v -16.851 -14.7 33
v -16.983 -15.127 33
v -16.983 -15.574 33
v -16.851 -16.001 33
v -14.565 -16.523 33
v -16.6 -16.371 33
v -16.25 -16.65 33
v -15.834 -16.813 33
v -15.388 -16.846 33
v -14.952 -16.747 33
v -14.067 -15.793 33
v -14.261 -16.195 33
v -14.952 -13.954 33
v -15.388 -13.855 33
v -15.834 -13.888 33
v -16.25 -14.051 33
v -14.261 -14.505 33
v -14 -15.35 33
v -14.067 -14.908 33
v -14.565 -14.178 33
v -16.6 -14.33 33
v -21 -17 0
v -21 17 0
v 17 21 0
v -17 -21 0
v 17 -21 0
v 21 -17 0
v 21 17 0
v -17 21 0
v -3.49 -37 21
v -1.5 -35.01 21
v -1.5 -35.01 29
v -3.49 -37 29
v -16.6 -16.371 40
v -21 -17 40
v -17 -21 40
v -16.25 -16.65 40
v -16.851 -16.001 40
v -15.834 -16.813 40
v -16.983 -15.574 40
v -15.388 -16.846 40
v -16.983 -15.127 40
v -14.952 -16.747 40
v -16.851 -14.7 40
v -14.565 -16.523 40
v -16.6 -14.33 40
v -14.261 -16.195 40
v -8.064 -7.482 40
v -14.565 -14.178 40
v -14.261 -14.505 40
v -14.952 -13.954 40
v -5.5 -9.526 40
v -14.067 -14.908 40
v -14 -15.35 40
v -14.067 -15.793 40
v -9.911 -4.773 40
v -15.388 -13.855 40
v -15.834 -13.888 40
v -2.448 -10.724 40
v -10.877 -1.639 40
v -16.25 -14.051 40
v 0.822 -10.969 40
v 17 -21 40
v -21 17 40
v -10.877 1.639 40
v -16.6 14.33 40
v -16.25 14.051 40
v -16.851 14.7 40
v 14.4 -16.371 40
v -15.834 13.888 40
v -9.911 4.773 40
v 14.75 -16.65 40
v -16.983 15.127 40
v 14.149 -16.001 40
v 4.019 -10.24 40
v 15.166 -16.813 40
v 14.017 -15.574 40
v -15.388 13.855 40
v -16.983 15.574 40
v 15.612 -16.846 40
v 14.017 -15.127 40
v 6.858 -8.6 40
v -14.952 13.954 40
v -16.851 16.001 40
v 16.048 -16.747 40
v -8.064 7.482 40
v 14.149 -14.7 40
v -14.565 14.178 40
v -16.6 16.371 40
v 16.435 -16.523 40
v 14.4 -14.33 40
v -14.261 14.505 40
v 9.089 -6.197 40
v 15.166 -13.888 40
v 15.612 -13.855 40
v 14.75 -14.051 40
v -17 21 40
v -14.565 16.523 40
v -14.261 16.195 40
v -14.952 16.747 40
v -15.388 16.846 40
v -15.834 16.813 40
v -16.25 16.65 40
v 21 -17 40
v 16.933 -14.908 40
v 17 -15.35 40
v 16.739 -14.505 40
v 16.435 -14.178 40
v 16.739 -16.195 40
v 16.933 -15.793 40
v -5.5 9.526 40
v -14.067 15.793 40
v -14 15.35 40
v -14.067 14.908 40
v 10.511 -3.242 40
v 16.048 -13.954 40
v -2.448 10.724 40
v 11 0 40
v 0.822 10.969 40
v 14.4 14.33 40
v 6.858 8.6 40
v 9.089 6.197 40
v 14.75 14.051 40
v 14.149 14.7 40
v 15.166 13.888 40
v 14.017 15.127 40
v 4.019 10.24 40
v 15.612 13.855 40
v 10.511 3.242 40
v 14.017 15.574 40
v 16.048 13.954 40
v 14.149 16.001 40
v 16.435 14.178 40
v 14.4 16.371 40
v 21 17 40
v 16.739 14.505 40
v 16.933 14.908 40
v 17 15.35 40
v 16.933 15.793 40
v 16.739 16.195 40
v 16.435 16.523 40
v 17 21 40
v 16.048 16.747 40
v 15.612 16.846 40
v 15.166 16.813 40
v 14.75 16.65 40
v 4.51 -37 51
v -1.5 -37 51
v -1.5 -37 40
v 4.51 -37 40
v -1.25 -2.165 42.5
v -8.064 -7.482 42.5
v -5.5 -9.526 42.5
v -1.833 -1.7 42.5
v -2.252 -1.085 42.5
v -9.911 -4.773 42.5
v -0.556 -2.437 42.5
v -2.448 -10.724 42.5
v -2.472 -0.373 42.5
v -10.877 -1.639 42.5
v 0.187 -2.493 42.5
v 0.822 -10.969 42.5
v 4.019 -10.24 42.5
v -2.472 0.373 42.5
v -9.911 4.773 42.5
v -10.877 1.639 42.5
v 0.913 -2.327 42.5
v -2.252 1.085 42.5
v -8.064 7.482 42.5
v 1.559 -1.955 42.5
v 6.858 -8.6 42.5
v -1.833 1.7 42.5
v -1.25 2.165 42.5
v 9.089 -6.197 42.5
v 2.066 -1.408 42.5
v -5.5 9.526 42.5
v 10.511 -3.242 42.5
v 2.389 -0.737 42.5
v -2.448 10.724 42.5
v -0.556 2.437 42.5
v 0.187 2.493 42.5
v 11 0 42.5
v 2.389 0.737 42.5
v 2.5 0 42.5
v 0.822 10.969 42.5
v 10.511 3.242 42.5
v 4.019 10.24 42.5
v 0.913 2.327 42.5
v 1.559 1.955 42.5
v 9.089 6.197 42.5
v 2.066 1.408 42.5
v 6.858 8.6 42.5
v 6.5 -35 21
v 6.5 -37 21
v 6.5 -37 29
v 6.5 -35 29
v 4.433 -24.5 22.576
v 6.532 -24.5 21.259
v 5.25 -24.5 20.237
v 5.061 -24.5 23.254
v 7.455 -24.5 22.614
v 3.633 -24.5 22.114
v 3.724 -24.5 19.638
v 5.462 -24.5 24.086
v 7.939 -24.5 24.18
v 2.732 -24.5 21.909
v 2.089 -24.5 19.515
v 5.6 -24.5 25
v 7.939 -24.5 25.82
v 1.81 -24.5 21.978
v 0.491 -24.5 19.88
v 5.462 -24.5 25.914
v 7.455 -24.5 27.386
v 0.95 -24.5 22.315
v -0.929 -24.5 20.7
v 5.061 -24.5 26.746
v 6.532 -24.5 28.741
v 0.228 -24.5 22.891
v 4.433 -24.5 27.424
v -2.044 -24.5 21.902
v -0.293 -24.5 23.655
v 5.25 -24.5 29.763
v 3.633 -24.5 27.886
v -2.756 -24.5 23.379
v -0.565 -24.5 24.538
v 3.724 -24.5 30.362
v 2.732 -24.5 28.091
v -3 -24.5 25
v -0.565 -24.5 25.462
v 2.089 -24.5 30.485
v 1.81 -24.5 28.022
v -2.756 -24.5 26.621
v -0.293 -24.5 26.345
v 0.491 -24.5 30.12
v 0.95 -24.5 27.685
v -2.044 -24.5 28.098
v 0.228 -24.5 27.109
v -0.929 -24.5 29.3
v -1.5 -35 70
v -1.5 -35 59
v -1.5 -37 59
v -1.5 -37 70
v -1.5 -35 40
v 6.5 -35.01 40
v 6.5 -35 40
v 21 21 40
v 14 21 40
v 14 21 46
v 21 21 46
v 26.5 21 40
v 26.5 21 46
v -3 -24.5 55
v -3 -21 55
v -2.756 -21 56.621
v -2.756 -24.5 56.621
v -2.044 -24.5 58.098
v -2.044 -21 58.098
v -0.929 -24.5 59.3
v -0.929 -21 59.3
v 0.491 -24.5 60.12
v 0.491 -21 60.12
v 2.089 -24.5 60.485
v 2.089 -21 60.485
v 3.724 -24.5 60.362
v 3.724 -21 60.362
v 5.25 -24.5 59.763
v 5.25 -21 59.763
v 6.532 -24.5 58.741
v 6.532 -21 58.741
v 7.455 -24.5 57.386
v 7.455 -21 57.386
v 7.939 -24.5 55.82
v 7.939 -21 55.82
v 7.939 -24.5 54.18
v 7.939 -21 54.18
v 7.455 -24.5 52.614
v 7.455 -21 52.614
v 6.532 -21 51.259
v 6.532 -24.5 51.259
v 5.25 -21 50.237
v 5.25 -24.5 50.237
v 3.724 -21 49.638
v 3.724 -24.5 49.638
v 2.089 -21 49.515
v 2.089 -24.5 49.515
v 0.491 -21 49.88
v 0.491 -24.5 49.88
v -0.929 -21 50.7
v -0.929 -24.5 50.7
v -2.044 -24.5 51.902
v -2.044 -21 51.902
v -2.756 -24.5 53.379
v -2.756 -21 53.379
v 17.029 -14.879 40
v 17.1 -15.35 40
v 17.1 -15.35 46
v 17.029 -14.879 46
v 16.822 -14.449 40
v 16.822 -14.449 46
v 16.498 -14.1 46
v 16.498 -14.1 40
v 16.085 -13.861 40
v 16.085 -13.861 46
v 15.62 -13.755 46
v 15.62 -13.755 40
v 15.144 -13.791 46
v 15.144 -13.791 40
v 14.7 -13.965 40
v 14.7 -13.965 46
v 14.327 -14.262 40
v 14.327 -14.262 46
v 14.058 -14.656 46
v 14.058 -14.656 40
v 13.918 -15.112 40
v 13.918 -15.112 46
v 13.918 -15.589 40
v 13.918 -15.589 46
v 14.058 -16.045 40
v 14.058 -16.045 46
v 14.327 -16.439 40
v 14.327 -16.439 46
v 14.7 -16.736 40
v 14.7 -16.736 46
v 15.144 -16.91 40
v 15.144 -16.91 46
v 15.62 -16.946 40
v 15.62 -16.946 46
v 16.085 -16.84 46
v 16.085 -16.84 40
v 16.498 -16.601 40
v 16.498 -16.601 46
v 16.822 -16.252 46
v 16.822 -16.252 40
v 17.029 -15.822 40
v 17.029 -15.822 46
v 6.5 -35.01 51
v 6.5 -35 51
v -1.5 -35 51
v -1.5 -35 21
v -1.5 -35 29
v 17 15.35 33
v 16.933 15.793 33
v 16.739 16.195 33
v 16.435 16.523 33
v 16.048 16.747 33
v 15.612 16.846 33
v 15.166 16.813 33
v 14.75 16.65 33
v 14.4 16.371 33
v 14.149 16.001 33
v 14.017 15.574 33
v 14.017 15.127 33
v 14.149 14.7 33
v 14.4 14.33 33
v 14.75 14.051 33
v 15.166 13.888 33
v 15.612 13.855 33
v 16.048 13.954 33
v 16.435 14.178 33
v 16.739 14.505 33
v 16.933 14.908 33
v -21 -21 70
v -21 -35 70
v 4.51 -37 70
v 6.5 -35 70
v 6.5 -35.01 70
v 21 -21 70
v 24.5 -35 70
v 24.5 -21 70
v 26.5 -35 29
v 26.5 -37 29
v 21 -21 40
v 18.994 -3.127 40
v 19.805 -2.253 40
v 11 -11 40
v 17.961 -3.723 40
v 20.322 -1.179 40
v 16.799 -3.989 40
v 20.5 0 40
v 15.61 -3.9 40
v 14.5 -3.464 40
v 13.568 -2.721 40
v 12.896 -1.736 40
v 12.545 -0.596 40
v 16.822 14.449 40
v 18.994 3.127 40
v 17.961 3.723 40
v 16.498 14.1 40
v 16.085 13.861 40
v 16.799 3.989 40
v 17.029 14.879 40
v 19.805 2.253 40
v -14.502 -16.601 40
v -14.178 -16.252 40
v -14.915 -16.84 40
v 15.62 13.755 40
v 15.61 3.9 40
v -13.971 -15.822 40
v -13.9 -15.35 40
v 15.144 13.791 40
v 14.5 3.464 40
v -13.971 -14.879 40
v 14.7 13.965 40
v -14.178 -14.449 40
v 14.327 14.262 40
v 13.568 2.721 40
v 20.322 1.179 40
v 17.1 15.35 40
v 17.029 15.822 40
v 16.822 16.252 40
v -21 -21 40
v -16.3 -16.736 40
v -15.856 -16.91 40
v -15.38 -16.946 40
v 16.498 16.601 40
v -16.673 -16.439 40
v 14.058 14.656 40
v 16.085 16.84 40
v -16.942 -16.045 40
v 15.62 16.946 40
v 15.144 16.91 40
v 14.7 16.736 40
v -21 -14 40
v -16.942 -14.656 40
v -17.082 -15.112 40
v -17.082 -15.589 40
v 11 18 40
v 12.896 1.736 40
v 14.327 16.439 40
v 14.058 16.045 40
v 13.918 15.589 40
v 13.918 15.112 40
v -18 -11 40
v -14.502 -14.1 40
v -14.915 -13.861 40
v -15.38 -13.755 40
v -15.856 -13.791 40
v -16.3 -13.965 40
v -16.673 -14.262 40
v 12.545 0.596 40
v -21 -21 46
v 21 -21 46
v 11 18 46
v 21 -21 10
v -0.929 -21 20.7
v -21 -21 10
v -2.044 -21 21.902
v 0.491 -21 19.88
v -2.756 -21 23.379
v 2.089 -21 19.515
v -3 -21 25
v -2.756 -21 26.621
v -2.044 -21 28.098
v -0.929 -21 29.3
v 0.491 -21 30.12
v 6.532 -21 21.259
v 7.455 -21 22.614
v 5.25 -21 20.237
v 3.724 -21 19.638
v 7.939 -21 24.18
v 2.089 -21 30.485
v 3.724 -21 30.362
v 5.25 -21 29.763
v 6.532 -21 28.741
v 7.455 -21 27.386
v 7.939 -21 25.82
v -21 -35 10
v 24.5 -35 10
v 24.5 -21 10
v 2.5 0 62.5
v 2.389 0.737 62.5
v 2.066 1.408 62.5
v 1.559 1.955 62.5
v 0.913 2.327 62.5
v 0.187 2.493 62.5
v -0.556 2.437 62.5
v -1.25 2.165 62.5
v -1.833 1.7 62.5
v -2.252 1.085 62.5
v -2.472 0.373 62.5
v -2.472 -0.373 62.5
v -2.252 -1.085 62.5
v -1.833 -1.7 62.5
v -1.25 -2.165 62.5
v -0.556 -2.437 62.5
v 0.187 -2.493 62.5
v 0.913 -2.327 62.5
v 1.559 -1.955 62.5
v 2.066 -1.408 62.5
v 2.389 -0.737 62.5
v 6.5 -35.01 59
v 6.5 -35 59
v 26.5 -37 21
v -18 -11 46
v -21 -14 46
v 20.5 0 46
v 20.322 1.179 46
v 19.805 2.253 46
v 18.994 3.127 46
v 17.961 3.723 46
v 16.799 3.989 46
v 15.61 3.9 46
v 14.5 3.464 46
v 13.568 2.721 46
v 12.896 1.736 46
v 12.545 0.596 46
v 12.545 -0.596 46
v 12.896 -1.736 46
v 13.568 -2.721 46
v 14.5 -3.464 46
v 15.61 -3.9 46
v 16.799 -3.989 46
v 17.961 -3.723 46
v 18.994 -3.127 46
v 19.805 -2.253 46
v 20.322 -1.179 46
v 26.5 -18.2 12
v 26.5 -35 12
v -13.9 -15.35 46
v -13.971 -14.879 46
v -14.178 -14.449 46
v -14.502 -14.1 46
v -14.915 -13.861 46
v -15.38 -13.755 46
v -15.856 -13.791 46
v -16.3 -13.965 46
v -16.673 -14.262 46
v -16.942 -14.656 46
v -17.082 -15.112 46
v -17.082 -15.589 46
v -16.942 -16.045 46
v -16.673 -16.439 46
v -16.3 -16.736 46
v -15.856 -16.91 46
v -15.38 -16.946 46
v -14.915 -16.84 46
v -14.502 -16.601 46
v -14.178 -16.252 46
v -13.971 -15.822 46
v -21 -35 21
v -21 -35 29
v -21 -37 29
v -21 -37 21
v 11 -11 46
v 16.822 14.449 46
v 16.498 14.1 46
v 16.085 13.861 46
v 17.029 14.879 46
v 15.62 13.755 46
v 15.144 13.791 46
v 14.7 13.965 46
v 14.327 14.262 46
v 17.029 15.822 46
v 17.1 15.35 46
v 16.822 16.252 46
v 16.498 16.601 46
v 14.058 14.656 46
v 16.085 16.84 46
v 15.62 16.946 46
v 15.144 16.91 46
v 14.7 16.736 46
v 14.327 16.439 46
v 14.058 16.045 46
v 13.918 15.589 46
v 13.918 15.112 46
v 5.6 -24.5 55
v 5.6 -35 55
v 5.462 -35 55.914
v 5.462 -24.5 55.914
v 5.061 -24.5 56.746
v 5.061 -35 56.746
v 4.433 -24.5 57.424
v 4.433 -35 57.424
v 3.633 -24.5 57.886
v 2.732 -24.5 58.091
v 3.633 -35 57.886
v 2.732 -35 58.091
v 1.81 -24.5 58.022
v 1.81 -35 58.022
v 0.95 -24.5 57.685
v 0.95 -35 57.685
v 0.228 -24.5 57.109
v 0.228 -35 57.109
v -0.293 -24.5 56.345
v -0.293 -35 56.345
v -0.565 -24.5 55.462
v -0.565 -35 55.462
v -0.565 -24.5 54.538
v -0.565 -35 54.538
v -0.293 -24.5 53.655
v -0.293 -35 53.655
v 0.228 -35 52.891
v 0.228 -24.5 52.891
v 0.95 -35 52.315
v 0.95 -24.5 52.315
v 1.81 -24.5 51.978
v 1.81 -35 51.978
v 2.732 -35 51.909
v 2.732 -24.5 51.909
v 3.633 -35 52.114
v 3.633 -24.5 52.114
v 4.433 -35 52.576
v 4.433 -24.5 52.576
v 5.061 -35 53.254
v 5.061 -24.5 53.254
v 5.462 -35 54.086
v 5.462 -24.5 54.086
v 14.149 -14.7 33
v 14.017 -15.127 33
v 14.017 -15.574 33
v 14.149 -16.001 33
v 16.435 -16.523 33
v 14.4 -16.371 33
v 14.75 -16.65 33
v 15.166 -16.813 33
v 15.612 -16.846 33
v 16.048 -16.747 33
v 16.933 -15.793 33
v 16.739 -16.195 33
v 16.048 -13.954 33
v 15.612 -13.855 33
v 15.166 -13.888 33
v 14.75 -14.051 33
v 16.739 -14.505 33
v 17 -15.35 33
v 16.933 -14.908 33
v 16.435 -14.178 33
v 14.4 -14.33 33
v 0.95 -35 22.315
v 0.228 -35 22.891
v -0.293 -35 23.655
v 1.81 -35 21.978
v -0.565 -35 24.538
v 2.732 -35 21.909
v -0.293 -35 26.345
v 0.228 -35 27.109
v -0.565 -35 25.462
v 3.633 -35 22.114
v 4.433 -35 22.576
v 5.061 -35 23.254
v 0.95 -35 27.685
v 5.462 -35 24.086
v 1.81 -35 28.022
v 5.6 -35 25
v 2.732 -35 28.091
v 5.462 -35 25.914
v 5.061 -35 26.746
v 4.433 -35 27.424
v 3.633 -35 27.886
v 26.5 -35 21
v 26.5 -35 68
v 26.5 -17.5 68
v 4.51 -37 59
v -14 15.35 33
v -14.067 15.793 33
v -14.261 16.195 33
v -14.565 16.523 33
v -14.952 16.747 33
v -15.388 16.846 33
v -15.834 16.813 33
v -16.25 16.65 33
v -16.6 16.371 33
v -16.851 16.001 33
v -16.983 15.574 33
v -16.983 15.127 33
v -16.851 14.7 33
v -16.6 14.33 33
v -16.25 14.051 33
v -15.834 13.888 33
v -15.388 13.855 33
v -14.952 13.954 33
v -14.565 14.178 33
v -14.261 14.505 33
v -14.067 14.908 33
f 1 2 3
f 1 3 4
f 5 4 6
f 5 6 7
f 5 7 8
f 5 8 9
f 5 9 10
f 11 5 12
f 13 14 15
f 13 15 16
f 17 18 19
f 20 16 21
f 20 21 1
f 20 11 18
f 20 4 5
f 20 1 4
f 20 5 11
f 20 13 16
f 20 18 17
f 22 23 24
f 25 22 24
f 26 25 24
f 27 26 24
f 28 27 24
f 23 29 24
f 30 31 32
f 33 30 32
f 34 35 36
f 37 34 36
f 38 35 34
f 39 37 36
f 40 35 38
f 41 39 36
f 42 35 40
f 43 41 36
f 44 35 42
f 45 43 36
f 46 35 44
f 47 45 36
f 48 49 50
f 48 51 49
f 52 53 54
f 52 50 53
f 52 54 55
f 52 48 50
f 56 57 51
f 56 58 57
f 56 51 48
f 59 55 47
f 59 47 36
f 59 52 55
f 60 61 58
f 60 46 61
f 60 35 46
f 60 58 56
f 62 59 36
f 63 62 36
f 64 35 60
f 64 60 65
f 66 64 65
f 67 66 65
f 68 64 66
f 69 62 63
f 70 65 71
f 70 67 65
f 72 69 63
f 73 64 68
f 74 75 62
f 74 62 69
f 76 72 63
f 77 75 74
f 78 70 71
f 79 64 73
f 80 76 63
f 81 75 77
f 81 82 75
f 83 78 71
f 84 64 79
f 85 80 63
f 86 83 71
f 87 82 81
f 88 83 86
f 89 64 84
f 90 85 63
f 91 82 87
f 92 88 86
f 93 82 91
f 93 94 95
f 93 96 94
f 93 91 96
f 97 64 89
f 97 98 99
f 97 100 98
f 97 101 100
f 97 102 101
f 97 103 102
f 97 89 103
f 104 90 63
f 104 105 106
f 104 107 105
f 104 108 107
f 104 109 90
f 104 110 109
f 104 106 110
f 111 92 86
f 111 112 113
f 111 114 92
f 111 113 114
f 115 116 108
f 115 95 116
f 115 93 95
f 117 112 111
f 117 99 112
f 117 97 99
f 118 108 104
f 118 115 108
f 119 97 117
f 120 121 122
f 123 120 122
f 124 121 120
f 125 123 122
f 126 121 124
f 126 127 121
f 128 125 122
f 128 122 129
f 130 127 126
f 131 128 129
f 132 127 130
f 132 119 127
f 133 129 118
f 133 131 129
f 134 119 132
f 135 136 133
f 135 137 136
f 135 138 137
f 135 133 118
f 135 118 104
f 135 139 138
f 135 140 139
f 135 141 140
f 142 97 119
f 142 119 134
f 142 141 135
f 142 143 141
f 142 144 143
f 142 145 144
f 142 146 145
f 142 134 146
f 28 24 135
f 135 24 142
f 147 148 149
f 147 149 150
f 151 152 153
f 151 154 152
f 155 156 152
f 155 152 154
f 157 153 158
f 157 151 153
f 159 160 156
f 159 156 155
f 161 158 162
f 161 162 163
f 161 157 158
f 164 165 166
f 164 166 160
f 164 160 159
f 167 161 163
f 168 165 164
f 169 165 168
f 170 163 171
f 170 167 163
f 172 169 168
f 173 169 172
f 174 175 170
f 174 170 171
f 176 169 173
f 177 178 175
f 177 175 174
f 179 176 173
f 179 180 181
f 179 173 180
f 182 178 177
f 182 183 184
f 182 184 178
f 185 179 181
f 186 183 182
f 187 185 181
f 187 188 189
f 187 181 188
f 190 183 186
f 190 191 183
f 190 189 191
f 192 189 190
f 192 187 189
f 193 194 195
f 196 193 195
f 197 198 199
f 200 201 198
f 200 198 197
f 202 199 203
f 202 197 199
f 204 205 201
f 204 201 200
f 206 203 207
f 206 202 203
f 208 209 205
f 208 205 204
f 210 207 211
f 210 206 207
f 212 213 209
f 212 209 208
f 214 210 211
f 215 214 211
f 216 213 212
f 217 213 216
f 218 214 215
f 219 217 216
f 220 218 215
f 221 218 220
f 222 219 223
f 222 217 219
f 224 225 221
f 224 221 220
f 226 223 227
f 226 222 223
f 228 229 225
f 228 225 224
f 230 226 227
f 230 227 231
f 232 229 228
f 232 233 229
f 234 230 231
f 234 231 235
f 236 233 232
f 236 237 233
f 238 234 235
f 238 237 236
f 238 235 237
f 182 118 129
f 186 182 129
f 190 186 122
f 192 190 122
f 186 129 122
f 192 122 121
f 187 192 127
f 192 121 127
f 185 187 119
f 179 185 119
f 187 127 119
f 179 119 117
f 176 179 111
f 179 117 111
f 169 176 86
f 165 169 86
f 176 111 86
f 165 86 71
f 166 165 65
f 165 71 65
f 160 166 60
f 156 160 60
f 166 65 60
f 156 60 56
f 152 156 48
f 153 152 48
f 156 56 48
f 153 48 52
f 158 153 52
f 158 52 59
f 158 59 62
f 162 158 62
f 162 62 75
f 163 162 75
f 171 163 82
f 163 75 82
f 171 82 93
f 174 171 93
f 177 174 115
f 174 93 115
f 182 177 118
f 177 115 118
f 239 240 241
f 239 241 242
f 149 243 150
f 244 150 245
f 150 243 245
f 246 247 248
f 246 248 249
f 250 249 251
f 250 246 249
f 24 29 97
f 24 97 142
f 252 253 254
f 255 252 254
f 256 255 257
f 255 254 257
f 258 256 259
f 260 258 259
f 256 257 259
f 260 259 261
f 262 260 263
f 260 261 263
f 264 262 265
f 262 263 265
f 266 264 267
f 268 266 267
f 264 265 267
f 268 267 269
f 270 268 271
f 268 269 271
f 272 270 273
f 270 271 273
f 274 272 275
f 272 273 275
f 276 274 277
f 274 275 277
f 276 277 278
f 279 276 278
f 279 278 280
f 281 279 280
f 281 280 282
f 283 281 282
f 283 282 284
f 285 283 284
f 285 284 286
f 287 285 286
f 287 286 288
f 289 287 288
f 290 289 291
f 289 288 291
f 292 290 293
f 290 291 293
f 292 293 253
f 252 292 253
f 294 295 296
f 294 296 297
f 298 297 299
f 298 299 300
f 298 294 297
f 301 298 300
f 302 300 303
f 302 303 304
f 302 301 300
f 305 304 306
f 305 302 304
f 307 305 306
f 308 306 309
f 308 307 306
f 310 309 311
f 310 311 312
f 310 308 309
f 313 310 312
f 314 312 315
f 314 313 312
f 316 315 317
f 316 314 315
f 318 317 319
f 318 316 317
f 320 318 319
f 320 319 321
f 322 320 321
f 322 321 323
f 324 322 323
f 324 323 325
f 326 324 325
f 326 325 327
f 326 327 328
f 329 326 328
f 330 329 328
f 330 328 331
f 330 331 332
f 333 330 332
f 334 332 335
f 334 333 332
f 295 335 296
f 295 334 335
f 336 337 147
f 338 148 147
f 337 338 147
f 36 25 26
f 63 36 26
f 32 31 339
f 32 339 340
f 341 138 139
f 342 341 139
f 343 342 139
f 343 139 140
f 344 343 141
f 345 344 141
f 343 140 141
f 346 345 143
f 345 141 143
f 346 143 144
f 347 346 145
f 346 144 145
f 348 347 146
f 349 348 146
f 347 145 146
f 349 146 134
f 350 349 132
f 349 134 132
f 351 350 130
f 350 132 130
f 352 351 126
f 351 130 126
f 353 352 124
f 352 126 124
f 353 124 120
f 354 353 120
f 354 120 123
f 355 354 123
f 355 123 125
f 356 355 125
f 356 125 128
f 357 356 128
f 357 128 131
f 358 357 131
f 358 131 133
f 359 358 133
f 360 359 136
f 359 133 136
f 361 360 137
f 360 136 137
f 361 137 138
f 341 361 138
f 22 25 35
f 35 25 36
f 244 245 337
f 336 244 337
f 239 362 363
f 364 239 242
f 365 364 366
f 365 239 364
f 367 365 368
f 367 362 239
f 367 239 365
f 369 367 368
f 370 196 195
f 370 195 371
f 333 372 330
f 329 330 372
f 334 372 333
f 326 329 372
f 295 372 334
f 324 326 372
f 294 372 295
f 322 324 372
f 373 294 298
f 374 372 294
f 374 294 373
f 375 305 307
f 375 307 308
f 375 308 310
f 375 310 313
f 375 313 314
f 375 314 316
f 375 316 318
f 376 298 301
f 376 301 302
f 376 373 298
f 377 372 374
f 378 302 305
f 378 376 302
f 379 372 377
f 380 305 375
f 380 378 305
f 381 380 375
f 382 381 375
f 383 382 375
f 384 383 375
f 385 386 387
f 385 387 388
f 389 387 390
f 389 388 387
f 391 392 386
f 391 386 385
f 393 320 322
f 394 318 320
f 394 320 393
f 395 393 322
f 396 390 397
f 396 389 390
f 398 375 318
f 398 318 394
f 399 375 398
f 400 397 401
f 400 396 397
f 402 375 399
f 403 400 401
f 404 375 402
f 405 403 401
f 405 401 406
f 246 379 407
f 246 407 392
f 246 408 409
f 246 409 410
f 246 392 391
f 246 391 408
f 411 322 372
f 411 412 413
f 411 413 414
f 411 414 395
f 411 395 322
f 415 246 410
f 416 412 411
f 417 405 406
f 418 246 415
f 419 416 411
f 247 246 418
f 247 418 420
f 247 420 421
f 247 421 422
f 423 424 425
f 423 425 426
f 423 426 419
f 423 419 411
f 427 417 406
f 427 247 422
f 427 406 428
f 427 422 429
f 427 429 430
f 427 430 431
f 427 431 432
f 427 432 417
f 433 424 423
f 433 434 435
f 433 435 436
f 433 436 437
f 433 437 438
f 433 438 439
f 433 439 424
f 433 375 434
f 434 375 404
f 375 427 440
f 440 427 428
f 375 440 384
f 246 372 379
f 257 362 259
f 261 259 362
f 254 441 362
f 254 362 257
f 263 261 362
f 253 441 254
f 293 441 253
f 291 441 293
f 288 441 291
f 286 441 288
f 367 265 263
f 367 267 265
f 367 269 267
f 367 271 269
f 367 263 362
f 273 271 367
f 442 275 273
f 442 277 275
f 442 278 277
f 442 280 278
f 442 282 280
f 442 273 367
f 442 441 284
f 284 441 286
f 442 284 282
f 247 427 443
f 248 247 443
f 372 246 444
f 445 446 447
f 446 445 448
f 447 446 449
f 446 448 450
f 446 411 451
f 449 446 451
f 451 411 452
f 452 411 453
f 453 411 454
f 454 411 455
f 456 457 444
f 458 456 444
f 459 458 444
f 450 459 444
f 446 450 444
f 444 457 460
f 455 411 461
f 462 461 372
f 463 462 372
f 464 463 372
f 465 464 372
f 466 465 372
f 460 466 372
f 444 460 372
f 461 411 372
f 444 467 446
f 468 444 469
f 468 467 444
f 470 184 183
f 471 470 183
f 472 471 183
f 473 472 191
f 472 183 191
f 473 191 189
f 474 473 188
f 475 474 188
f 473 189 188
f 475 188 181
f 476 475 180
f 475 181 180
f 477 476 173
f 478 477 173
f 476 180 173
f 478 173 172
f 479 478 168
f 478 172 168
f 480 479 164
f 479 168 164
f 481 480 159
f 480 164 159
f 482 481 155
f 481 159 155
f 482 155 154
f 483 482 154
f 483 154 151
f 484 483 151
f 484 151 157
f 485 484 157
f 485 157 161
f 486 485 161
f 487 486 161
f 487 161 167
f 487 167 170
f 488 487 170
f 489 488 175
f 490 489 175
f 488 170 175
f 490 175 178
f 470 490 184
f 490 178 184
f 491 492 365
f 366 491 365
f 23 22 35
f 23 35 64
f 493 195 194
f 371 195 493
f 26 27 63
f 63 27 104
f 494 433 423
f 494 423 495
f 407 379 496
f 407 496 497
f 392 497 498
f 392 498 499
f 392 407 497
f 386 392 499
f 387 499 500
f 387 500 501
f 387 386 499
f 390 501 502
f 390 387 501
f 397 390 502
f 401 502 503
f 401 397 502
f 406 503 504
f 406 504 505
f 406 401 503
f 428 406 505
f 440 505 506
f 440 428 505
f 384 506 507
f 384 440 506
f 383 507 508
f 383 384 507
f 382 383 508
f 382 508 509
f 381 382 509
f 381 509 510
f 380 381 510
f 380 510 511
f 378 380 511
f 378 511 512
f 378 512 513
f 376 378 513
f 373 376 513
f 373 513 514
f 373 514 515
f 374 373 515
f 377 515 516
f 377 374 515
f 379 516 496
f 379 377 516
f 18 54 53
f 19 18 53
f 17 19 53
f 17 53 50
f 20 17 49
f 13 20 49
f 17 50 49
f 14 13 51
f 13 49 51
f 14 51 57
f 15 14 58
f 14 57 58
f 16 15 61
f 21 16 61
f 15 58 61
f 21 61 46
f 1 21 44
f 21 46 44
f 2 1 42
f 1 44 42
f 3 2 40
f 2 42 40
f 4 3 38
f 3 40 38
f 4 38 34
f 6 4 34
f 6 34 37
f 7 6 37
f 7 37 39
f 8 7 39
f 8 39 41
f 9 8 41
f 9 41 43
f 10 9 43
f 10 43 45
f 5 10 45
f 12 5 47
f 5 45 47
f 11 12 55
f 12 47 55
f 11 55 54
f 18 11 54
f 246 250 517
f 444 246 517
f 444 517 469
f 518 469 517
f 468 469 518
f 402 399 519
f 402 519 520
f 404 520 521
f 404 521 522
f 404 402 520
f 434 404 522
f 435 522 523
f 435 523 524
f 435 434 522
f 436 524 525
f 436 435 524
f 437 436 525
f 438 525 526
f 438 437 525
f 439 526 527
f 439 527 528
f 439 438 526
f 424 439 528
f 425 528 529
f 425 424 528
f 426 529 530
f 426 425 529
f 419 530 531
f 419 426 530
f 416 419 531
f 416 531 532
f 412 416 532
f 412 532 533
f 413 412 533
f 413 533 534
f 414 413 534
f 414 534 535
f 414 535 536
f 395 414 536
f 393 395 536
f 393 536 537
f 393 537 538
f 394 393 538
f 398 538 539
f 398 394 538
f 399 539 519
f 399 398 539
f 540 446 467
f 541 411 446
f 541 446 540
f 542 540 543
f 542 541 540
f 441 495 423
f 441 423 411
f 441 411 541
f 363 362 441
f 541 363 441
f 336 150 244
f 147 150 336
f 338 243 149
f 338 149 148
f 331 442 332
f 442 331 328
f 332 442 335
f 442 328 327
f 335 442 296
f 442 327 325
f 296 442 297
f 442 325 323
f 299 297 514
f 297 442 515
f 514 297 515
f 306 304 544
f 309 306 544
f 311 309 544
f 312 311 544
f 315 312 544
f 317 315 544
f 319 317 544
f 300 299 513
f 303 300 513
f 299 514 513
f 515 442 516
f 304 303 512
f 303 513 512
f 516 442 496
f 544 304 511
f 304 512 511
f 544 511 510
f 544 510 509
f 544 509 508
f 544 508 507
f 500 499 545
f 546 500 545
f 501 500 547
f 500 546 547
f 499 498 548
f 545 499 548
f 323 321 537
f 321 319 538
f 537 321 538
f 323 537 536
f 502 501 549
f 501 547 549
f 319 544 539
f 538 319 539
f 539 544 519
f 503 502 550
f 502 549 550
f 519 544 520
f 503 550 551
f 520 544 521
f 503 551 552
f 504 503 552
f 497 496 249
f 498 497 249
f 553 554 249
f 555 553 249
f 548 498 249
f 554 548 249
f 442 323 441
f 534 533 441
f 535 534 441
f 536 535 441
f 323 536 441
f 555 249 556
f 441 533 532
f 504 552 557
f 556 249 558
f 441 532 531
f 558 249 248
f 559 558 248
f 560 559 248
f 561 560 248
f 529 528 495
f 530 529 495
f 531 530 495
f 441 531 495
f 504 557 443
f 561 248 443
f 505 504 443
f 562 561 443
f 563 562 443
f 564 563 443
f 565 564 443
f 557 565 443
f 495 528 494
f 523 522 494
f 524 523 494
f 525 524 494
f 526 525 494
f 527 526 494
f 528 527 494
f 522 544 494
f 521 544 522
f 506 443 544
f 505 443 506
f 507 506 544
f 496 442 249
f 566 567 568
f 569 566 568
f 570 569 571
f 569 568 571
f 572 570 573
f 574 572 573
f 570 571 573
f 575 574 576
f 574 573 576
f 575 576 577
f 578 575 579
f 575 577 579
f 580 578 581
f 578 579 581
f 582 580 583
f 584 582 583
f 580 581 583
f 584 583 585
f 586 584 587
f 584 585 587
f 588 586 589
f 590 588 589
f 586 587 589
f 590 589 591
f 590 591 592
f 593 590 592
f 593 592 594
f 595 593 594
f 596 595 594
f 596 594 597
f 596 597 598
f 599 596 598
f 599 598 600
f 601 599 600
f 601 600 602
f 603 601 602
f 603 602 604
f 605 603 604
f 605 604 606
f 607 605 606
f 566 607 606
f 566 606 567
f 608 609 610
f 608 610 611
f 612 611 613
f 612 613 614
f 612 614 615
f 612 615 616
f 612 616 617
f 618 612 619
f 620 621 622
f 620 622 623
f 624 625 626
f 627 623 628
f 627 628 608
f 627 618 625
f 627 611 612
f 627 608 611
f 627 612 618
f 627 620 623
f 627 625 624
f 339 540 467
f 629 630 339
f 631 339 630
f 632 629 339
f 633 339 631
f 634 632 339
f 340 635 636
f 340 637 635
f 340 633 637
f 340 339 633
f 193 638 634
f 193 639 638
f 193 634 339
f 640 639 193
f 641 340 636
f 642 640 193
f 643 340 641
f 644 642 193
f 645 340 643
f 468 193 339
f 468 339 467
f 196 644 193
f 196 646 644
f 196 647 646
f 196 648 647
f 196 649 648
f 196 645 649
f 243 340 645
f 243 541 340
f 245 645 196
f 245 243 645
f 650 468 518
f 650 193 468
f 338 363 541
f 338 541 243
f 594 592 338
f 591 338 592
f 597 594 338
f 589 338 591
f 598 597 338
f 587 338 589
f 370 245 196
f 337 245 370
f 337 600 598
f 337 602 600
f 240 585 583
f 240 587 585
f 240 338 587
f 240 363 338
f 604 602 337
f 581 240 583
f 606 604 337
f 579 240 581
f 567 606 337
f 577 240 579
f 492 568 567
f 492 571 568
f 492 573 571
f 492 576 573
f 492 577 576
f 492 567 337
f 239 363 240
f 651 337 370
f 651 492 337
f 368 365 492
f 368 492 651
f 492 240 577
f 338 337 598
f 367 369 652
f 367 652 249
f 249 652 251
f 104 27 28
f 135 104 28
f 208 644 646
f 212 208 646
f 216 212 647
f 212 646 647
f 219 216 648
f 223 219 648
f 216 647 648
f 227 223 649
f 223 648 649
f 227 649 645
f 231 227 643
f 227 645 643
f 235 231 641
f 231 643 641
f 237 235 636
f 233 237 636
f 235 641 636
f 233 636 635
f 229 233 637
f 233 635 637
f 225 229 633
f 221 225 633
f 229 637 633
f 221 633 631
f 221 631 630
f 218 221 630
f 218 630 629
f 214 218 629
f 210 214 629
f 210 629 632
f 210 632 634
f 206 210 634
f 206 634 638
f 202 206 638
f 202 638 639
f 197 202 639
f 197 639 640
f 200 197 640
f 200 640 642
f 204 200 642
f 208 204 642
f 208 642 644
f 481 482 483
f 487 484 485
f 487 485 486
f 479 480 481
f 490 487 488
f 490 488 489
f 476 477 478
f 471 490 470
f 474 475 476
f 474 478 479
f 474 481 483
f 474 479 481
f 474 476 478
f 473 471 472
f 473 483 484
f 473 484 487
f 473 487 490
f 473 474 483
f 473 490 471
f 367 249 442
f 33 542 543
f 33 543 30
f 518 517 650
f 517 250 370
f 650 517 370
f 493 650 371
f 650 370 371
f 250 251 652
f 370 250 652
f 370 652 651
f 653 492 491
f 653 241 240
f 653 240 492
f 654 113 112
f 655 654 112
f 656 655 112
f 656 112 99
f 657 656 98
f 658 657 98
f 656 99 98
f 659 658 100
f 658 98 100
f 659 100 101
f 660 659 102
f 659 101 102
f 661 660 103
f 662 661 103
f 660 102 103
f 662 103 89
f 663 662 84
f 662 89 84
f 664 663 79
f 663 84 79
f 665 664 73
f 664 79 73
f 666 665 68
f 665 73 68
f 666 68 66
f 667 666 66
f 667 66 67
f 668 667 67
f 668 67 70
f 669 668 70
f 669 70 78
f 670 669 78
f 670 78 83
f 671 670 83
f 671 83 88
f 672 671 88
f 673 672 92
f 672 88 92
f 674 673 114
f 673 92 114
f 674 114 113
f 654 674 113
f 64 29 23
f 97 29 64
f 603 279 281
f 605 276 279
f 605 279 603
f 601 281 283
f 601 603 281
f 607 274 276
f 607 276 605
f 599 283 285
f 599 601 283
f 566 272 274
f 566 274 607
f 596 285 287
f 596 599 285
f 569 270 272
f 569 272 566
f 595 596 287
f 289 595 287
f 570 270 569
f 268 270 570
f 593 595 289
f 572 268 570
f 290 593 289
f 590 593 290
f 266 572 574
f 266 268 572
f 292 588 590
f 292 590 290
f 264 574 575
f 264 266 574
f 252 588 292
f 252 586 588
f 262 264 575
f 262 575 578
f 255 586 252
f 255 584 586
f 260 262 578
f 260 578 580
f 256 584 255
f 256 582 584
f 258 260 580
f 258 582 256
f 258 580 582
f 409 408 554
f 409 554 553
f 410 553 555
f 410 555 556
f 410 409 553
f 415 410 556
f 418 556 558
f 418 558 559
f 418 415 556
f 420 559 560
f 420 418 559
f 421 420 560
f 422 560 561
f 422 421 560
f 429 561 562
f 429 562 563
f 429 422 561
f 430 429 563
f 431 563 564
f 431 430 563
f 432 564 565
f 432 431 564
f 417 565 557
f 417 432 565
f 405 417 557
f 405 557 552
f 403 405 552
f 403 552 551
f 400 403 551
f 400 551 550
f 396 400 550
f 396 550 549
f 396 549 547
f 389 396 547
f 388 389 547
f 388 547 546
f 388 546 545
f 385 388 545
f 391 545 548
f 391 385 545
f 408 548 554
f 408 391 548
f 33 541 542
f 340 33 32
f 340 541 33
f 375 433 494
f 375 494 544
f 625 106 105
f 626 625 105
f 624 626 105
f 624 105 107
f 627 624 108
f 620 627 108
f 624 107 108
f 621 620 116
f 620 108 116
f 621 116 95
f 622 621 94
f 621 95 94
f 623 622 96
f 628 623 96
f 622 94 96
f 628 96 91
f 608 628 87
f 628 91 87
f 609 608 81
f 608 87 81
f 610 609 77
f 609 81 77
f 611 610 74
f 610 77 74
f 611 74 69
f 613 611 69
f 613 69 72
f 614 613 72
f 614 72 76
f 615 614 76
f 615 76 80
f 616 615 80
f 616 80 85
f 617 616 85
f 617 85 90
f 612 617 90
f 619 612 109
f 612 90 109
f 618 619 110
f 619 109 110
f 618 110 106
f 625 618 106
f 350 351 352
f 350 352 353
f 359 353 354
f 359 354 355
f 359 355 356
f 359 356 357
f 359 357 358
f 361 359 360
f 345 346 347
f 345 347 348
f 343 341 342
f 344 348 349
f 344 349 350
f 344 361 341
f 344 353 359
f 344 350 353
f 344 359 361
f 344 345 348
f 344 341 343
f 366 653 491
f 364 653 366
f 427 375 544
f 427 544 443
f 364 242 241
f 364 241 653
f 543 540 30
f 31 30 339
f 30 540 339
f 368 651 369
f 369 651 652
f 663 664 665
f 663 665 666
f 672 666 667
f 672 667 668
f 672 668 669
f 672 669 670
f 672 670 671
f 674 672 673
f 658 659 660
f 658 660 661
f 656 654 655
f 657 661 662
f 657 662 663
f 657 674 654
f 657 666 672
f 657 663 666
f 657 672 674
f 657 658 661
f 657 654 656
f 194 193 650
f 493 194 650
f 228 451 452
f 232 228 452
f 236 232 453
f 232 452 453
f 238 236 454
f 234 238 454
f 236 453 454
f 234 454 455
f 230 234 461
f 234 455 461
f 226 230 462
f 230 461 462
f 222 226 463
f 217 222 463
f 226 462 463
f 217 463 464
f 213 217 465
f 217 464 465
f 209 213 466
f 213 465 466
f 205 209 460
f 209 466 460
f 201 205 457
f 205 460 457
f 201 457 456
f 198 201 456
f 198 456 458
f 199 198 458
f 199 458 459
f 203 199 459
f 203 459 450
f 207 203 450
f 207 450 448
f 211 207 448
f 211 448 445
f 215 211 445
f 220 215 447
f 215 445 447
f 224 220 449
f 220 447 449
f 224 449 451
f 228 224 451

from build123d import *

# Parameters (mm, degrees)
SKETCH_W        = 42
SKETCH_H        = 42
PAD_DEPTH       = 40
CHAMFER_SIZE    = 4
SKETCH001_R     = 11
PAD001_DEPTH    = 2.5
SKETCH002_R     = 2.5
PAD002_DEPTH    = 20
SKETCH003_R     = 1.5
POCKET_DEPTH    = 7
SKETCH004_R     = 4
SKETCH004_R_2   = 1.6
PAD003_DEPTH    = 6
SKETCH005_W     = 47.5
SKETCH005_H     = 14
PAD004_DEPTH    = 24
SKETCH006_W     = 47.5
SKETCH006_H     = 14
PAD005_DEPTH    = 30
PAD006_DEPTH    = 5.5
SKETCH008_W     = 8
SKETCH008_H     = 30
PAD007_DEPTH    = 2
SKETCH009_W     = 47.5
SKETCH009_H     = 8
PAD008_DEPTH    = 2
SKETCH010_R     = 3.1
POCKET001_DEPTH = 58.001
SKETCH011_W     = 8
SKETCH011_H     = 8
POCKET002_DEPTH = 2
CHAMFER001_SIZE = 2
CHAMFER002_SIZE = 3
CHAMFER003_SIZE = 1.99
SKETCH012_R     = 5.5
POCKET003_DEPTH = 3.5


with BuildPart() as motor:
    # Sketch → Pad (new body)
    with BuildSketch(Plane.XY):
        Rectangle(SKETCH_W, SKETCH_H)
    extrude(amount=PAD_DEPTH)

    # Chamfer
    chamfer_edges = [motor.edges().sort_by_distance(p)[0] for p in [
        (21, -21, 20),
        (-21, -21, 20),
        (-21, 21, 20),
        (21, 21, 20),
    ]]
    chamfer(chamfer_edges, length=CHAMFER_SIZE)

    # Sketch001 (on Face5 of Chamfer) → Pad001 (join)
    with BuildSketch(Plane.XY.offset(40)):
        Circle(SKETCH001_R)
    extrude(amount=PAD001_DEPTH)

    # Sketch002 (on Face12 of Pad001) → Pad002 (join)
    with BuildSketch(Plane.XY.offset(42.5)):
        Circle(SKETCH002_R)
    extrude(amount=PAD002_DEPTH)

    # Sketch003 (on Face5 of Pad002) → Pocket (cut)
    with BuildSketch(Plane.XY.offset(40)):
        with Locations((-15.5, 15.350468)):
            Circle(SKETCH003_R)
        with Locations((15.5, 15.350468)):
            Circle(SKETCH003_R)
        with Locations((15.5, -15.350468)):
            Circle(SKETCH003_R)
        with Locations((-15.5, -15.350468)):
            Circle(SKETCH003_R)
    extrude(amount=-POCKET_DEPTH, mode=Mode.SUBTRACT)


with BuildPart() as y_motor:
    # Sketch004 (on Face1 of ShapeBinder) → Pad003 (new body)
    with BuildSketch(Plane.XY.offset(40)):
        Polygon((11, 21), (26.5, 21), (26.5, -35), (-21, -35), (-21, -11), (11, -11), align=None)
        with Locations((16.5, 0)):
            Circle(SKETCH004_R, mode=Mode.SUBTRACT)
        with Locations((15.5, 15.350468)):
            Circle(SKETCH004_R_2, mode=Mode.SUBTRACT)
        with Locations((-15.5, -15.350468)):
            Circle(SKETCH004_R_2, mode=Mode.SUBTRACT)
        with Locations((15.5, -15.350468)):
            Circle(SKETCH004_R_2, mode=Mode.SUBTRACT)
    extrude(amount=PAD003_DEPTH)

    # Sketch005 (on Face12 of Pad003) → Pad004 (join)
    with BuildSketch(Plane.XY.offset(46)):
        with Locations((2.75, -28)):
            Rectangle(SKETCH005_W, SKETCH005_H)
    extrude(amount=PAD004_DEPTH)

    # Sketch006 (on Face4 of Pad004) → Pad005 (join)
    with BuildSketch(Plane(origin=(0, 0, 40), x_dir=(1, 0, 0), z_dir=(0, 0, -1))):
        with Locations((2.75, 28)):
            Rectangle(SKETCH006_W, SKETCH006_H)
    extrude(amount=PAD005_DEPTH)

    # Sketch007 (on Face14 of Pad005) → Pad006 (join)
    with BuildSketch(Plane.YZ.offset(26.5)):
        Polygon((-21, 70), (21, 46), (-21, 46), align=None)
        Polygon((-21, 40), (21, 40), (-21, 10), align=None)
    extrude(amount=-PAD006_DEPTH)

    # Sketch008 (on Face18 of Pad006) → Pad007 (join)
    with BuildSketch(Plane.XZ.offset(35)):
        with Locations((2.5, 55)):
            Rectangle(SKETCH008_W, SKETCH008_H)
    extrude(amount=PAD007_DEPTH)

    # Sketch009 (on Face19 of Pad007) → Pad008 (join)
    with BuildSketch(Plane.XZ.offset(35)):
        with Locations((2.75, 25)):
            Rectangle(SKETCH009_W, SKETCH009_H)
    extrude(amount=PAD008_DEPTH)

    # Sketch010 (on Face27 of Pad008) → Pocket001 (cut, through all)
    with BuildSketch(Plane.XZ.offset(37)):
        with Locations((2.5, 25)):
            Circle(SKETCH010_R)
        with Locations((2.5, 55)):
            Circle(SKETCH010_R)
    extrude(amount=-POCKET001_DEPTH, mode=Mode.SUBTRACT)

    # Sketch011 (on Face29 of Pocket001) → Pocket002 (cut)
    with BuildSketch(Plane.XZ.offset(37)):
        with Locations((2.5, 25)):
            Rectangle(SKETCH011_W, SKETCH011_H)
        with Locations((2.5, 55)):
            Rectangle(SKETCH011_W, SKETCH011_H)
    extrude(amount=-POCKET002_DEPTH, mode=Mode.SUBTRACT)

    # Chamfer001
    chamfer001_edges = [y_motor.edges().sort_by_distance(p)[0] for p in [
        (26.5, -28, 10),
        (26.5, -28, 70),
    ]]
    chamfer(chamfer001_edges, length=CHAMFER001_SIZE)

    # Chamfer002
    chamfer002_edges = [y_motor.edges().sort_by_distance(p)[0] for p in [
        (-21, -11, 43),
        (11, 21, 43),
    ]]
    chamfer(chamfer002_edges, length=CHAMFER002_SIZE)

    # Chamfer003
    chamfer003_edges = [y_motor.edges().sort_by_distance(p)[0] for p in [
        (-1.5, -37, 25),
        (6.5, -37, 45.5),
        (6.5, -37, 64.5),
    ]]
    chamfer(chamfer003_edges, length=CHAMFER003_SIZE)

    # Sketch012 (on Face22 of Chamfer003) → Pocket003 (cut)
    with BuildSketch(Plane(origin=(0, -21, 0), x_dir=(-1, 0, 0), z_dir=(0, 1, 0))):
        with Locations((-2.5, 55)):
            Circle(SKETCH012_R)
        with Locations((-2.5, 25)):
            Circle(SKETCH012_R)
    extrude(amount=-POCKET003_DEPTH, mode=Mode.SUBTRACT)


solid = Compound([motor.part, y_motor.part])
